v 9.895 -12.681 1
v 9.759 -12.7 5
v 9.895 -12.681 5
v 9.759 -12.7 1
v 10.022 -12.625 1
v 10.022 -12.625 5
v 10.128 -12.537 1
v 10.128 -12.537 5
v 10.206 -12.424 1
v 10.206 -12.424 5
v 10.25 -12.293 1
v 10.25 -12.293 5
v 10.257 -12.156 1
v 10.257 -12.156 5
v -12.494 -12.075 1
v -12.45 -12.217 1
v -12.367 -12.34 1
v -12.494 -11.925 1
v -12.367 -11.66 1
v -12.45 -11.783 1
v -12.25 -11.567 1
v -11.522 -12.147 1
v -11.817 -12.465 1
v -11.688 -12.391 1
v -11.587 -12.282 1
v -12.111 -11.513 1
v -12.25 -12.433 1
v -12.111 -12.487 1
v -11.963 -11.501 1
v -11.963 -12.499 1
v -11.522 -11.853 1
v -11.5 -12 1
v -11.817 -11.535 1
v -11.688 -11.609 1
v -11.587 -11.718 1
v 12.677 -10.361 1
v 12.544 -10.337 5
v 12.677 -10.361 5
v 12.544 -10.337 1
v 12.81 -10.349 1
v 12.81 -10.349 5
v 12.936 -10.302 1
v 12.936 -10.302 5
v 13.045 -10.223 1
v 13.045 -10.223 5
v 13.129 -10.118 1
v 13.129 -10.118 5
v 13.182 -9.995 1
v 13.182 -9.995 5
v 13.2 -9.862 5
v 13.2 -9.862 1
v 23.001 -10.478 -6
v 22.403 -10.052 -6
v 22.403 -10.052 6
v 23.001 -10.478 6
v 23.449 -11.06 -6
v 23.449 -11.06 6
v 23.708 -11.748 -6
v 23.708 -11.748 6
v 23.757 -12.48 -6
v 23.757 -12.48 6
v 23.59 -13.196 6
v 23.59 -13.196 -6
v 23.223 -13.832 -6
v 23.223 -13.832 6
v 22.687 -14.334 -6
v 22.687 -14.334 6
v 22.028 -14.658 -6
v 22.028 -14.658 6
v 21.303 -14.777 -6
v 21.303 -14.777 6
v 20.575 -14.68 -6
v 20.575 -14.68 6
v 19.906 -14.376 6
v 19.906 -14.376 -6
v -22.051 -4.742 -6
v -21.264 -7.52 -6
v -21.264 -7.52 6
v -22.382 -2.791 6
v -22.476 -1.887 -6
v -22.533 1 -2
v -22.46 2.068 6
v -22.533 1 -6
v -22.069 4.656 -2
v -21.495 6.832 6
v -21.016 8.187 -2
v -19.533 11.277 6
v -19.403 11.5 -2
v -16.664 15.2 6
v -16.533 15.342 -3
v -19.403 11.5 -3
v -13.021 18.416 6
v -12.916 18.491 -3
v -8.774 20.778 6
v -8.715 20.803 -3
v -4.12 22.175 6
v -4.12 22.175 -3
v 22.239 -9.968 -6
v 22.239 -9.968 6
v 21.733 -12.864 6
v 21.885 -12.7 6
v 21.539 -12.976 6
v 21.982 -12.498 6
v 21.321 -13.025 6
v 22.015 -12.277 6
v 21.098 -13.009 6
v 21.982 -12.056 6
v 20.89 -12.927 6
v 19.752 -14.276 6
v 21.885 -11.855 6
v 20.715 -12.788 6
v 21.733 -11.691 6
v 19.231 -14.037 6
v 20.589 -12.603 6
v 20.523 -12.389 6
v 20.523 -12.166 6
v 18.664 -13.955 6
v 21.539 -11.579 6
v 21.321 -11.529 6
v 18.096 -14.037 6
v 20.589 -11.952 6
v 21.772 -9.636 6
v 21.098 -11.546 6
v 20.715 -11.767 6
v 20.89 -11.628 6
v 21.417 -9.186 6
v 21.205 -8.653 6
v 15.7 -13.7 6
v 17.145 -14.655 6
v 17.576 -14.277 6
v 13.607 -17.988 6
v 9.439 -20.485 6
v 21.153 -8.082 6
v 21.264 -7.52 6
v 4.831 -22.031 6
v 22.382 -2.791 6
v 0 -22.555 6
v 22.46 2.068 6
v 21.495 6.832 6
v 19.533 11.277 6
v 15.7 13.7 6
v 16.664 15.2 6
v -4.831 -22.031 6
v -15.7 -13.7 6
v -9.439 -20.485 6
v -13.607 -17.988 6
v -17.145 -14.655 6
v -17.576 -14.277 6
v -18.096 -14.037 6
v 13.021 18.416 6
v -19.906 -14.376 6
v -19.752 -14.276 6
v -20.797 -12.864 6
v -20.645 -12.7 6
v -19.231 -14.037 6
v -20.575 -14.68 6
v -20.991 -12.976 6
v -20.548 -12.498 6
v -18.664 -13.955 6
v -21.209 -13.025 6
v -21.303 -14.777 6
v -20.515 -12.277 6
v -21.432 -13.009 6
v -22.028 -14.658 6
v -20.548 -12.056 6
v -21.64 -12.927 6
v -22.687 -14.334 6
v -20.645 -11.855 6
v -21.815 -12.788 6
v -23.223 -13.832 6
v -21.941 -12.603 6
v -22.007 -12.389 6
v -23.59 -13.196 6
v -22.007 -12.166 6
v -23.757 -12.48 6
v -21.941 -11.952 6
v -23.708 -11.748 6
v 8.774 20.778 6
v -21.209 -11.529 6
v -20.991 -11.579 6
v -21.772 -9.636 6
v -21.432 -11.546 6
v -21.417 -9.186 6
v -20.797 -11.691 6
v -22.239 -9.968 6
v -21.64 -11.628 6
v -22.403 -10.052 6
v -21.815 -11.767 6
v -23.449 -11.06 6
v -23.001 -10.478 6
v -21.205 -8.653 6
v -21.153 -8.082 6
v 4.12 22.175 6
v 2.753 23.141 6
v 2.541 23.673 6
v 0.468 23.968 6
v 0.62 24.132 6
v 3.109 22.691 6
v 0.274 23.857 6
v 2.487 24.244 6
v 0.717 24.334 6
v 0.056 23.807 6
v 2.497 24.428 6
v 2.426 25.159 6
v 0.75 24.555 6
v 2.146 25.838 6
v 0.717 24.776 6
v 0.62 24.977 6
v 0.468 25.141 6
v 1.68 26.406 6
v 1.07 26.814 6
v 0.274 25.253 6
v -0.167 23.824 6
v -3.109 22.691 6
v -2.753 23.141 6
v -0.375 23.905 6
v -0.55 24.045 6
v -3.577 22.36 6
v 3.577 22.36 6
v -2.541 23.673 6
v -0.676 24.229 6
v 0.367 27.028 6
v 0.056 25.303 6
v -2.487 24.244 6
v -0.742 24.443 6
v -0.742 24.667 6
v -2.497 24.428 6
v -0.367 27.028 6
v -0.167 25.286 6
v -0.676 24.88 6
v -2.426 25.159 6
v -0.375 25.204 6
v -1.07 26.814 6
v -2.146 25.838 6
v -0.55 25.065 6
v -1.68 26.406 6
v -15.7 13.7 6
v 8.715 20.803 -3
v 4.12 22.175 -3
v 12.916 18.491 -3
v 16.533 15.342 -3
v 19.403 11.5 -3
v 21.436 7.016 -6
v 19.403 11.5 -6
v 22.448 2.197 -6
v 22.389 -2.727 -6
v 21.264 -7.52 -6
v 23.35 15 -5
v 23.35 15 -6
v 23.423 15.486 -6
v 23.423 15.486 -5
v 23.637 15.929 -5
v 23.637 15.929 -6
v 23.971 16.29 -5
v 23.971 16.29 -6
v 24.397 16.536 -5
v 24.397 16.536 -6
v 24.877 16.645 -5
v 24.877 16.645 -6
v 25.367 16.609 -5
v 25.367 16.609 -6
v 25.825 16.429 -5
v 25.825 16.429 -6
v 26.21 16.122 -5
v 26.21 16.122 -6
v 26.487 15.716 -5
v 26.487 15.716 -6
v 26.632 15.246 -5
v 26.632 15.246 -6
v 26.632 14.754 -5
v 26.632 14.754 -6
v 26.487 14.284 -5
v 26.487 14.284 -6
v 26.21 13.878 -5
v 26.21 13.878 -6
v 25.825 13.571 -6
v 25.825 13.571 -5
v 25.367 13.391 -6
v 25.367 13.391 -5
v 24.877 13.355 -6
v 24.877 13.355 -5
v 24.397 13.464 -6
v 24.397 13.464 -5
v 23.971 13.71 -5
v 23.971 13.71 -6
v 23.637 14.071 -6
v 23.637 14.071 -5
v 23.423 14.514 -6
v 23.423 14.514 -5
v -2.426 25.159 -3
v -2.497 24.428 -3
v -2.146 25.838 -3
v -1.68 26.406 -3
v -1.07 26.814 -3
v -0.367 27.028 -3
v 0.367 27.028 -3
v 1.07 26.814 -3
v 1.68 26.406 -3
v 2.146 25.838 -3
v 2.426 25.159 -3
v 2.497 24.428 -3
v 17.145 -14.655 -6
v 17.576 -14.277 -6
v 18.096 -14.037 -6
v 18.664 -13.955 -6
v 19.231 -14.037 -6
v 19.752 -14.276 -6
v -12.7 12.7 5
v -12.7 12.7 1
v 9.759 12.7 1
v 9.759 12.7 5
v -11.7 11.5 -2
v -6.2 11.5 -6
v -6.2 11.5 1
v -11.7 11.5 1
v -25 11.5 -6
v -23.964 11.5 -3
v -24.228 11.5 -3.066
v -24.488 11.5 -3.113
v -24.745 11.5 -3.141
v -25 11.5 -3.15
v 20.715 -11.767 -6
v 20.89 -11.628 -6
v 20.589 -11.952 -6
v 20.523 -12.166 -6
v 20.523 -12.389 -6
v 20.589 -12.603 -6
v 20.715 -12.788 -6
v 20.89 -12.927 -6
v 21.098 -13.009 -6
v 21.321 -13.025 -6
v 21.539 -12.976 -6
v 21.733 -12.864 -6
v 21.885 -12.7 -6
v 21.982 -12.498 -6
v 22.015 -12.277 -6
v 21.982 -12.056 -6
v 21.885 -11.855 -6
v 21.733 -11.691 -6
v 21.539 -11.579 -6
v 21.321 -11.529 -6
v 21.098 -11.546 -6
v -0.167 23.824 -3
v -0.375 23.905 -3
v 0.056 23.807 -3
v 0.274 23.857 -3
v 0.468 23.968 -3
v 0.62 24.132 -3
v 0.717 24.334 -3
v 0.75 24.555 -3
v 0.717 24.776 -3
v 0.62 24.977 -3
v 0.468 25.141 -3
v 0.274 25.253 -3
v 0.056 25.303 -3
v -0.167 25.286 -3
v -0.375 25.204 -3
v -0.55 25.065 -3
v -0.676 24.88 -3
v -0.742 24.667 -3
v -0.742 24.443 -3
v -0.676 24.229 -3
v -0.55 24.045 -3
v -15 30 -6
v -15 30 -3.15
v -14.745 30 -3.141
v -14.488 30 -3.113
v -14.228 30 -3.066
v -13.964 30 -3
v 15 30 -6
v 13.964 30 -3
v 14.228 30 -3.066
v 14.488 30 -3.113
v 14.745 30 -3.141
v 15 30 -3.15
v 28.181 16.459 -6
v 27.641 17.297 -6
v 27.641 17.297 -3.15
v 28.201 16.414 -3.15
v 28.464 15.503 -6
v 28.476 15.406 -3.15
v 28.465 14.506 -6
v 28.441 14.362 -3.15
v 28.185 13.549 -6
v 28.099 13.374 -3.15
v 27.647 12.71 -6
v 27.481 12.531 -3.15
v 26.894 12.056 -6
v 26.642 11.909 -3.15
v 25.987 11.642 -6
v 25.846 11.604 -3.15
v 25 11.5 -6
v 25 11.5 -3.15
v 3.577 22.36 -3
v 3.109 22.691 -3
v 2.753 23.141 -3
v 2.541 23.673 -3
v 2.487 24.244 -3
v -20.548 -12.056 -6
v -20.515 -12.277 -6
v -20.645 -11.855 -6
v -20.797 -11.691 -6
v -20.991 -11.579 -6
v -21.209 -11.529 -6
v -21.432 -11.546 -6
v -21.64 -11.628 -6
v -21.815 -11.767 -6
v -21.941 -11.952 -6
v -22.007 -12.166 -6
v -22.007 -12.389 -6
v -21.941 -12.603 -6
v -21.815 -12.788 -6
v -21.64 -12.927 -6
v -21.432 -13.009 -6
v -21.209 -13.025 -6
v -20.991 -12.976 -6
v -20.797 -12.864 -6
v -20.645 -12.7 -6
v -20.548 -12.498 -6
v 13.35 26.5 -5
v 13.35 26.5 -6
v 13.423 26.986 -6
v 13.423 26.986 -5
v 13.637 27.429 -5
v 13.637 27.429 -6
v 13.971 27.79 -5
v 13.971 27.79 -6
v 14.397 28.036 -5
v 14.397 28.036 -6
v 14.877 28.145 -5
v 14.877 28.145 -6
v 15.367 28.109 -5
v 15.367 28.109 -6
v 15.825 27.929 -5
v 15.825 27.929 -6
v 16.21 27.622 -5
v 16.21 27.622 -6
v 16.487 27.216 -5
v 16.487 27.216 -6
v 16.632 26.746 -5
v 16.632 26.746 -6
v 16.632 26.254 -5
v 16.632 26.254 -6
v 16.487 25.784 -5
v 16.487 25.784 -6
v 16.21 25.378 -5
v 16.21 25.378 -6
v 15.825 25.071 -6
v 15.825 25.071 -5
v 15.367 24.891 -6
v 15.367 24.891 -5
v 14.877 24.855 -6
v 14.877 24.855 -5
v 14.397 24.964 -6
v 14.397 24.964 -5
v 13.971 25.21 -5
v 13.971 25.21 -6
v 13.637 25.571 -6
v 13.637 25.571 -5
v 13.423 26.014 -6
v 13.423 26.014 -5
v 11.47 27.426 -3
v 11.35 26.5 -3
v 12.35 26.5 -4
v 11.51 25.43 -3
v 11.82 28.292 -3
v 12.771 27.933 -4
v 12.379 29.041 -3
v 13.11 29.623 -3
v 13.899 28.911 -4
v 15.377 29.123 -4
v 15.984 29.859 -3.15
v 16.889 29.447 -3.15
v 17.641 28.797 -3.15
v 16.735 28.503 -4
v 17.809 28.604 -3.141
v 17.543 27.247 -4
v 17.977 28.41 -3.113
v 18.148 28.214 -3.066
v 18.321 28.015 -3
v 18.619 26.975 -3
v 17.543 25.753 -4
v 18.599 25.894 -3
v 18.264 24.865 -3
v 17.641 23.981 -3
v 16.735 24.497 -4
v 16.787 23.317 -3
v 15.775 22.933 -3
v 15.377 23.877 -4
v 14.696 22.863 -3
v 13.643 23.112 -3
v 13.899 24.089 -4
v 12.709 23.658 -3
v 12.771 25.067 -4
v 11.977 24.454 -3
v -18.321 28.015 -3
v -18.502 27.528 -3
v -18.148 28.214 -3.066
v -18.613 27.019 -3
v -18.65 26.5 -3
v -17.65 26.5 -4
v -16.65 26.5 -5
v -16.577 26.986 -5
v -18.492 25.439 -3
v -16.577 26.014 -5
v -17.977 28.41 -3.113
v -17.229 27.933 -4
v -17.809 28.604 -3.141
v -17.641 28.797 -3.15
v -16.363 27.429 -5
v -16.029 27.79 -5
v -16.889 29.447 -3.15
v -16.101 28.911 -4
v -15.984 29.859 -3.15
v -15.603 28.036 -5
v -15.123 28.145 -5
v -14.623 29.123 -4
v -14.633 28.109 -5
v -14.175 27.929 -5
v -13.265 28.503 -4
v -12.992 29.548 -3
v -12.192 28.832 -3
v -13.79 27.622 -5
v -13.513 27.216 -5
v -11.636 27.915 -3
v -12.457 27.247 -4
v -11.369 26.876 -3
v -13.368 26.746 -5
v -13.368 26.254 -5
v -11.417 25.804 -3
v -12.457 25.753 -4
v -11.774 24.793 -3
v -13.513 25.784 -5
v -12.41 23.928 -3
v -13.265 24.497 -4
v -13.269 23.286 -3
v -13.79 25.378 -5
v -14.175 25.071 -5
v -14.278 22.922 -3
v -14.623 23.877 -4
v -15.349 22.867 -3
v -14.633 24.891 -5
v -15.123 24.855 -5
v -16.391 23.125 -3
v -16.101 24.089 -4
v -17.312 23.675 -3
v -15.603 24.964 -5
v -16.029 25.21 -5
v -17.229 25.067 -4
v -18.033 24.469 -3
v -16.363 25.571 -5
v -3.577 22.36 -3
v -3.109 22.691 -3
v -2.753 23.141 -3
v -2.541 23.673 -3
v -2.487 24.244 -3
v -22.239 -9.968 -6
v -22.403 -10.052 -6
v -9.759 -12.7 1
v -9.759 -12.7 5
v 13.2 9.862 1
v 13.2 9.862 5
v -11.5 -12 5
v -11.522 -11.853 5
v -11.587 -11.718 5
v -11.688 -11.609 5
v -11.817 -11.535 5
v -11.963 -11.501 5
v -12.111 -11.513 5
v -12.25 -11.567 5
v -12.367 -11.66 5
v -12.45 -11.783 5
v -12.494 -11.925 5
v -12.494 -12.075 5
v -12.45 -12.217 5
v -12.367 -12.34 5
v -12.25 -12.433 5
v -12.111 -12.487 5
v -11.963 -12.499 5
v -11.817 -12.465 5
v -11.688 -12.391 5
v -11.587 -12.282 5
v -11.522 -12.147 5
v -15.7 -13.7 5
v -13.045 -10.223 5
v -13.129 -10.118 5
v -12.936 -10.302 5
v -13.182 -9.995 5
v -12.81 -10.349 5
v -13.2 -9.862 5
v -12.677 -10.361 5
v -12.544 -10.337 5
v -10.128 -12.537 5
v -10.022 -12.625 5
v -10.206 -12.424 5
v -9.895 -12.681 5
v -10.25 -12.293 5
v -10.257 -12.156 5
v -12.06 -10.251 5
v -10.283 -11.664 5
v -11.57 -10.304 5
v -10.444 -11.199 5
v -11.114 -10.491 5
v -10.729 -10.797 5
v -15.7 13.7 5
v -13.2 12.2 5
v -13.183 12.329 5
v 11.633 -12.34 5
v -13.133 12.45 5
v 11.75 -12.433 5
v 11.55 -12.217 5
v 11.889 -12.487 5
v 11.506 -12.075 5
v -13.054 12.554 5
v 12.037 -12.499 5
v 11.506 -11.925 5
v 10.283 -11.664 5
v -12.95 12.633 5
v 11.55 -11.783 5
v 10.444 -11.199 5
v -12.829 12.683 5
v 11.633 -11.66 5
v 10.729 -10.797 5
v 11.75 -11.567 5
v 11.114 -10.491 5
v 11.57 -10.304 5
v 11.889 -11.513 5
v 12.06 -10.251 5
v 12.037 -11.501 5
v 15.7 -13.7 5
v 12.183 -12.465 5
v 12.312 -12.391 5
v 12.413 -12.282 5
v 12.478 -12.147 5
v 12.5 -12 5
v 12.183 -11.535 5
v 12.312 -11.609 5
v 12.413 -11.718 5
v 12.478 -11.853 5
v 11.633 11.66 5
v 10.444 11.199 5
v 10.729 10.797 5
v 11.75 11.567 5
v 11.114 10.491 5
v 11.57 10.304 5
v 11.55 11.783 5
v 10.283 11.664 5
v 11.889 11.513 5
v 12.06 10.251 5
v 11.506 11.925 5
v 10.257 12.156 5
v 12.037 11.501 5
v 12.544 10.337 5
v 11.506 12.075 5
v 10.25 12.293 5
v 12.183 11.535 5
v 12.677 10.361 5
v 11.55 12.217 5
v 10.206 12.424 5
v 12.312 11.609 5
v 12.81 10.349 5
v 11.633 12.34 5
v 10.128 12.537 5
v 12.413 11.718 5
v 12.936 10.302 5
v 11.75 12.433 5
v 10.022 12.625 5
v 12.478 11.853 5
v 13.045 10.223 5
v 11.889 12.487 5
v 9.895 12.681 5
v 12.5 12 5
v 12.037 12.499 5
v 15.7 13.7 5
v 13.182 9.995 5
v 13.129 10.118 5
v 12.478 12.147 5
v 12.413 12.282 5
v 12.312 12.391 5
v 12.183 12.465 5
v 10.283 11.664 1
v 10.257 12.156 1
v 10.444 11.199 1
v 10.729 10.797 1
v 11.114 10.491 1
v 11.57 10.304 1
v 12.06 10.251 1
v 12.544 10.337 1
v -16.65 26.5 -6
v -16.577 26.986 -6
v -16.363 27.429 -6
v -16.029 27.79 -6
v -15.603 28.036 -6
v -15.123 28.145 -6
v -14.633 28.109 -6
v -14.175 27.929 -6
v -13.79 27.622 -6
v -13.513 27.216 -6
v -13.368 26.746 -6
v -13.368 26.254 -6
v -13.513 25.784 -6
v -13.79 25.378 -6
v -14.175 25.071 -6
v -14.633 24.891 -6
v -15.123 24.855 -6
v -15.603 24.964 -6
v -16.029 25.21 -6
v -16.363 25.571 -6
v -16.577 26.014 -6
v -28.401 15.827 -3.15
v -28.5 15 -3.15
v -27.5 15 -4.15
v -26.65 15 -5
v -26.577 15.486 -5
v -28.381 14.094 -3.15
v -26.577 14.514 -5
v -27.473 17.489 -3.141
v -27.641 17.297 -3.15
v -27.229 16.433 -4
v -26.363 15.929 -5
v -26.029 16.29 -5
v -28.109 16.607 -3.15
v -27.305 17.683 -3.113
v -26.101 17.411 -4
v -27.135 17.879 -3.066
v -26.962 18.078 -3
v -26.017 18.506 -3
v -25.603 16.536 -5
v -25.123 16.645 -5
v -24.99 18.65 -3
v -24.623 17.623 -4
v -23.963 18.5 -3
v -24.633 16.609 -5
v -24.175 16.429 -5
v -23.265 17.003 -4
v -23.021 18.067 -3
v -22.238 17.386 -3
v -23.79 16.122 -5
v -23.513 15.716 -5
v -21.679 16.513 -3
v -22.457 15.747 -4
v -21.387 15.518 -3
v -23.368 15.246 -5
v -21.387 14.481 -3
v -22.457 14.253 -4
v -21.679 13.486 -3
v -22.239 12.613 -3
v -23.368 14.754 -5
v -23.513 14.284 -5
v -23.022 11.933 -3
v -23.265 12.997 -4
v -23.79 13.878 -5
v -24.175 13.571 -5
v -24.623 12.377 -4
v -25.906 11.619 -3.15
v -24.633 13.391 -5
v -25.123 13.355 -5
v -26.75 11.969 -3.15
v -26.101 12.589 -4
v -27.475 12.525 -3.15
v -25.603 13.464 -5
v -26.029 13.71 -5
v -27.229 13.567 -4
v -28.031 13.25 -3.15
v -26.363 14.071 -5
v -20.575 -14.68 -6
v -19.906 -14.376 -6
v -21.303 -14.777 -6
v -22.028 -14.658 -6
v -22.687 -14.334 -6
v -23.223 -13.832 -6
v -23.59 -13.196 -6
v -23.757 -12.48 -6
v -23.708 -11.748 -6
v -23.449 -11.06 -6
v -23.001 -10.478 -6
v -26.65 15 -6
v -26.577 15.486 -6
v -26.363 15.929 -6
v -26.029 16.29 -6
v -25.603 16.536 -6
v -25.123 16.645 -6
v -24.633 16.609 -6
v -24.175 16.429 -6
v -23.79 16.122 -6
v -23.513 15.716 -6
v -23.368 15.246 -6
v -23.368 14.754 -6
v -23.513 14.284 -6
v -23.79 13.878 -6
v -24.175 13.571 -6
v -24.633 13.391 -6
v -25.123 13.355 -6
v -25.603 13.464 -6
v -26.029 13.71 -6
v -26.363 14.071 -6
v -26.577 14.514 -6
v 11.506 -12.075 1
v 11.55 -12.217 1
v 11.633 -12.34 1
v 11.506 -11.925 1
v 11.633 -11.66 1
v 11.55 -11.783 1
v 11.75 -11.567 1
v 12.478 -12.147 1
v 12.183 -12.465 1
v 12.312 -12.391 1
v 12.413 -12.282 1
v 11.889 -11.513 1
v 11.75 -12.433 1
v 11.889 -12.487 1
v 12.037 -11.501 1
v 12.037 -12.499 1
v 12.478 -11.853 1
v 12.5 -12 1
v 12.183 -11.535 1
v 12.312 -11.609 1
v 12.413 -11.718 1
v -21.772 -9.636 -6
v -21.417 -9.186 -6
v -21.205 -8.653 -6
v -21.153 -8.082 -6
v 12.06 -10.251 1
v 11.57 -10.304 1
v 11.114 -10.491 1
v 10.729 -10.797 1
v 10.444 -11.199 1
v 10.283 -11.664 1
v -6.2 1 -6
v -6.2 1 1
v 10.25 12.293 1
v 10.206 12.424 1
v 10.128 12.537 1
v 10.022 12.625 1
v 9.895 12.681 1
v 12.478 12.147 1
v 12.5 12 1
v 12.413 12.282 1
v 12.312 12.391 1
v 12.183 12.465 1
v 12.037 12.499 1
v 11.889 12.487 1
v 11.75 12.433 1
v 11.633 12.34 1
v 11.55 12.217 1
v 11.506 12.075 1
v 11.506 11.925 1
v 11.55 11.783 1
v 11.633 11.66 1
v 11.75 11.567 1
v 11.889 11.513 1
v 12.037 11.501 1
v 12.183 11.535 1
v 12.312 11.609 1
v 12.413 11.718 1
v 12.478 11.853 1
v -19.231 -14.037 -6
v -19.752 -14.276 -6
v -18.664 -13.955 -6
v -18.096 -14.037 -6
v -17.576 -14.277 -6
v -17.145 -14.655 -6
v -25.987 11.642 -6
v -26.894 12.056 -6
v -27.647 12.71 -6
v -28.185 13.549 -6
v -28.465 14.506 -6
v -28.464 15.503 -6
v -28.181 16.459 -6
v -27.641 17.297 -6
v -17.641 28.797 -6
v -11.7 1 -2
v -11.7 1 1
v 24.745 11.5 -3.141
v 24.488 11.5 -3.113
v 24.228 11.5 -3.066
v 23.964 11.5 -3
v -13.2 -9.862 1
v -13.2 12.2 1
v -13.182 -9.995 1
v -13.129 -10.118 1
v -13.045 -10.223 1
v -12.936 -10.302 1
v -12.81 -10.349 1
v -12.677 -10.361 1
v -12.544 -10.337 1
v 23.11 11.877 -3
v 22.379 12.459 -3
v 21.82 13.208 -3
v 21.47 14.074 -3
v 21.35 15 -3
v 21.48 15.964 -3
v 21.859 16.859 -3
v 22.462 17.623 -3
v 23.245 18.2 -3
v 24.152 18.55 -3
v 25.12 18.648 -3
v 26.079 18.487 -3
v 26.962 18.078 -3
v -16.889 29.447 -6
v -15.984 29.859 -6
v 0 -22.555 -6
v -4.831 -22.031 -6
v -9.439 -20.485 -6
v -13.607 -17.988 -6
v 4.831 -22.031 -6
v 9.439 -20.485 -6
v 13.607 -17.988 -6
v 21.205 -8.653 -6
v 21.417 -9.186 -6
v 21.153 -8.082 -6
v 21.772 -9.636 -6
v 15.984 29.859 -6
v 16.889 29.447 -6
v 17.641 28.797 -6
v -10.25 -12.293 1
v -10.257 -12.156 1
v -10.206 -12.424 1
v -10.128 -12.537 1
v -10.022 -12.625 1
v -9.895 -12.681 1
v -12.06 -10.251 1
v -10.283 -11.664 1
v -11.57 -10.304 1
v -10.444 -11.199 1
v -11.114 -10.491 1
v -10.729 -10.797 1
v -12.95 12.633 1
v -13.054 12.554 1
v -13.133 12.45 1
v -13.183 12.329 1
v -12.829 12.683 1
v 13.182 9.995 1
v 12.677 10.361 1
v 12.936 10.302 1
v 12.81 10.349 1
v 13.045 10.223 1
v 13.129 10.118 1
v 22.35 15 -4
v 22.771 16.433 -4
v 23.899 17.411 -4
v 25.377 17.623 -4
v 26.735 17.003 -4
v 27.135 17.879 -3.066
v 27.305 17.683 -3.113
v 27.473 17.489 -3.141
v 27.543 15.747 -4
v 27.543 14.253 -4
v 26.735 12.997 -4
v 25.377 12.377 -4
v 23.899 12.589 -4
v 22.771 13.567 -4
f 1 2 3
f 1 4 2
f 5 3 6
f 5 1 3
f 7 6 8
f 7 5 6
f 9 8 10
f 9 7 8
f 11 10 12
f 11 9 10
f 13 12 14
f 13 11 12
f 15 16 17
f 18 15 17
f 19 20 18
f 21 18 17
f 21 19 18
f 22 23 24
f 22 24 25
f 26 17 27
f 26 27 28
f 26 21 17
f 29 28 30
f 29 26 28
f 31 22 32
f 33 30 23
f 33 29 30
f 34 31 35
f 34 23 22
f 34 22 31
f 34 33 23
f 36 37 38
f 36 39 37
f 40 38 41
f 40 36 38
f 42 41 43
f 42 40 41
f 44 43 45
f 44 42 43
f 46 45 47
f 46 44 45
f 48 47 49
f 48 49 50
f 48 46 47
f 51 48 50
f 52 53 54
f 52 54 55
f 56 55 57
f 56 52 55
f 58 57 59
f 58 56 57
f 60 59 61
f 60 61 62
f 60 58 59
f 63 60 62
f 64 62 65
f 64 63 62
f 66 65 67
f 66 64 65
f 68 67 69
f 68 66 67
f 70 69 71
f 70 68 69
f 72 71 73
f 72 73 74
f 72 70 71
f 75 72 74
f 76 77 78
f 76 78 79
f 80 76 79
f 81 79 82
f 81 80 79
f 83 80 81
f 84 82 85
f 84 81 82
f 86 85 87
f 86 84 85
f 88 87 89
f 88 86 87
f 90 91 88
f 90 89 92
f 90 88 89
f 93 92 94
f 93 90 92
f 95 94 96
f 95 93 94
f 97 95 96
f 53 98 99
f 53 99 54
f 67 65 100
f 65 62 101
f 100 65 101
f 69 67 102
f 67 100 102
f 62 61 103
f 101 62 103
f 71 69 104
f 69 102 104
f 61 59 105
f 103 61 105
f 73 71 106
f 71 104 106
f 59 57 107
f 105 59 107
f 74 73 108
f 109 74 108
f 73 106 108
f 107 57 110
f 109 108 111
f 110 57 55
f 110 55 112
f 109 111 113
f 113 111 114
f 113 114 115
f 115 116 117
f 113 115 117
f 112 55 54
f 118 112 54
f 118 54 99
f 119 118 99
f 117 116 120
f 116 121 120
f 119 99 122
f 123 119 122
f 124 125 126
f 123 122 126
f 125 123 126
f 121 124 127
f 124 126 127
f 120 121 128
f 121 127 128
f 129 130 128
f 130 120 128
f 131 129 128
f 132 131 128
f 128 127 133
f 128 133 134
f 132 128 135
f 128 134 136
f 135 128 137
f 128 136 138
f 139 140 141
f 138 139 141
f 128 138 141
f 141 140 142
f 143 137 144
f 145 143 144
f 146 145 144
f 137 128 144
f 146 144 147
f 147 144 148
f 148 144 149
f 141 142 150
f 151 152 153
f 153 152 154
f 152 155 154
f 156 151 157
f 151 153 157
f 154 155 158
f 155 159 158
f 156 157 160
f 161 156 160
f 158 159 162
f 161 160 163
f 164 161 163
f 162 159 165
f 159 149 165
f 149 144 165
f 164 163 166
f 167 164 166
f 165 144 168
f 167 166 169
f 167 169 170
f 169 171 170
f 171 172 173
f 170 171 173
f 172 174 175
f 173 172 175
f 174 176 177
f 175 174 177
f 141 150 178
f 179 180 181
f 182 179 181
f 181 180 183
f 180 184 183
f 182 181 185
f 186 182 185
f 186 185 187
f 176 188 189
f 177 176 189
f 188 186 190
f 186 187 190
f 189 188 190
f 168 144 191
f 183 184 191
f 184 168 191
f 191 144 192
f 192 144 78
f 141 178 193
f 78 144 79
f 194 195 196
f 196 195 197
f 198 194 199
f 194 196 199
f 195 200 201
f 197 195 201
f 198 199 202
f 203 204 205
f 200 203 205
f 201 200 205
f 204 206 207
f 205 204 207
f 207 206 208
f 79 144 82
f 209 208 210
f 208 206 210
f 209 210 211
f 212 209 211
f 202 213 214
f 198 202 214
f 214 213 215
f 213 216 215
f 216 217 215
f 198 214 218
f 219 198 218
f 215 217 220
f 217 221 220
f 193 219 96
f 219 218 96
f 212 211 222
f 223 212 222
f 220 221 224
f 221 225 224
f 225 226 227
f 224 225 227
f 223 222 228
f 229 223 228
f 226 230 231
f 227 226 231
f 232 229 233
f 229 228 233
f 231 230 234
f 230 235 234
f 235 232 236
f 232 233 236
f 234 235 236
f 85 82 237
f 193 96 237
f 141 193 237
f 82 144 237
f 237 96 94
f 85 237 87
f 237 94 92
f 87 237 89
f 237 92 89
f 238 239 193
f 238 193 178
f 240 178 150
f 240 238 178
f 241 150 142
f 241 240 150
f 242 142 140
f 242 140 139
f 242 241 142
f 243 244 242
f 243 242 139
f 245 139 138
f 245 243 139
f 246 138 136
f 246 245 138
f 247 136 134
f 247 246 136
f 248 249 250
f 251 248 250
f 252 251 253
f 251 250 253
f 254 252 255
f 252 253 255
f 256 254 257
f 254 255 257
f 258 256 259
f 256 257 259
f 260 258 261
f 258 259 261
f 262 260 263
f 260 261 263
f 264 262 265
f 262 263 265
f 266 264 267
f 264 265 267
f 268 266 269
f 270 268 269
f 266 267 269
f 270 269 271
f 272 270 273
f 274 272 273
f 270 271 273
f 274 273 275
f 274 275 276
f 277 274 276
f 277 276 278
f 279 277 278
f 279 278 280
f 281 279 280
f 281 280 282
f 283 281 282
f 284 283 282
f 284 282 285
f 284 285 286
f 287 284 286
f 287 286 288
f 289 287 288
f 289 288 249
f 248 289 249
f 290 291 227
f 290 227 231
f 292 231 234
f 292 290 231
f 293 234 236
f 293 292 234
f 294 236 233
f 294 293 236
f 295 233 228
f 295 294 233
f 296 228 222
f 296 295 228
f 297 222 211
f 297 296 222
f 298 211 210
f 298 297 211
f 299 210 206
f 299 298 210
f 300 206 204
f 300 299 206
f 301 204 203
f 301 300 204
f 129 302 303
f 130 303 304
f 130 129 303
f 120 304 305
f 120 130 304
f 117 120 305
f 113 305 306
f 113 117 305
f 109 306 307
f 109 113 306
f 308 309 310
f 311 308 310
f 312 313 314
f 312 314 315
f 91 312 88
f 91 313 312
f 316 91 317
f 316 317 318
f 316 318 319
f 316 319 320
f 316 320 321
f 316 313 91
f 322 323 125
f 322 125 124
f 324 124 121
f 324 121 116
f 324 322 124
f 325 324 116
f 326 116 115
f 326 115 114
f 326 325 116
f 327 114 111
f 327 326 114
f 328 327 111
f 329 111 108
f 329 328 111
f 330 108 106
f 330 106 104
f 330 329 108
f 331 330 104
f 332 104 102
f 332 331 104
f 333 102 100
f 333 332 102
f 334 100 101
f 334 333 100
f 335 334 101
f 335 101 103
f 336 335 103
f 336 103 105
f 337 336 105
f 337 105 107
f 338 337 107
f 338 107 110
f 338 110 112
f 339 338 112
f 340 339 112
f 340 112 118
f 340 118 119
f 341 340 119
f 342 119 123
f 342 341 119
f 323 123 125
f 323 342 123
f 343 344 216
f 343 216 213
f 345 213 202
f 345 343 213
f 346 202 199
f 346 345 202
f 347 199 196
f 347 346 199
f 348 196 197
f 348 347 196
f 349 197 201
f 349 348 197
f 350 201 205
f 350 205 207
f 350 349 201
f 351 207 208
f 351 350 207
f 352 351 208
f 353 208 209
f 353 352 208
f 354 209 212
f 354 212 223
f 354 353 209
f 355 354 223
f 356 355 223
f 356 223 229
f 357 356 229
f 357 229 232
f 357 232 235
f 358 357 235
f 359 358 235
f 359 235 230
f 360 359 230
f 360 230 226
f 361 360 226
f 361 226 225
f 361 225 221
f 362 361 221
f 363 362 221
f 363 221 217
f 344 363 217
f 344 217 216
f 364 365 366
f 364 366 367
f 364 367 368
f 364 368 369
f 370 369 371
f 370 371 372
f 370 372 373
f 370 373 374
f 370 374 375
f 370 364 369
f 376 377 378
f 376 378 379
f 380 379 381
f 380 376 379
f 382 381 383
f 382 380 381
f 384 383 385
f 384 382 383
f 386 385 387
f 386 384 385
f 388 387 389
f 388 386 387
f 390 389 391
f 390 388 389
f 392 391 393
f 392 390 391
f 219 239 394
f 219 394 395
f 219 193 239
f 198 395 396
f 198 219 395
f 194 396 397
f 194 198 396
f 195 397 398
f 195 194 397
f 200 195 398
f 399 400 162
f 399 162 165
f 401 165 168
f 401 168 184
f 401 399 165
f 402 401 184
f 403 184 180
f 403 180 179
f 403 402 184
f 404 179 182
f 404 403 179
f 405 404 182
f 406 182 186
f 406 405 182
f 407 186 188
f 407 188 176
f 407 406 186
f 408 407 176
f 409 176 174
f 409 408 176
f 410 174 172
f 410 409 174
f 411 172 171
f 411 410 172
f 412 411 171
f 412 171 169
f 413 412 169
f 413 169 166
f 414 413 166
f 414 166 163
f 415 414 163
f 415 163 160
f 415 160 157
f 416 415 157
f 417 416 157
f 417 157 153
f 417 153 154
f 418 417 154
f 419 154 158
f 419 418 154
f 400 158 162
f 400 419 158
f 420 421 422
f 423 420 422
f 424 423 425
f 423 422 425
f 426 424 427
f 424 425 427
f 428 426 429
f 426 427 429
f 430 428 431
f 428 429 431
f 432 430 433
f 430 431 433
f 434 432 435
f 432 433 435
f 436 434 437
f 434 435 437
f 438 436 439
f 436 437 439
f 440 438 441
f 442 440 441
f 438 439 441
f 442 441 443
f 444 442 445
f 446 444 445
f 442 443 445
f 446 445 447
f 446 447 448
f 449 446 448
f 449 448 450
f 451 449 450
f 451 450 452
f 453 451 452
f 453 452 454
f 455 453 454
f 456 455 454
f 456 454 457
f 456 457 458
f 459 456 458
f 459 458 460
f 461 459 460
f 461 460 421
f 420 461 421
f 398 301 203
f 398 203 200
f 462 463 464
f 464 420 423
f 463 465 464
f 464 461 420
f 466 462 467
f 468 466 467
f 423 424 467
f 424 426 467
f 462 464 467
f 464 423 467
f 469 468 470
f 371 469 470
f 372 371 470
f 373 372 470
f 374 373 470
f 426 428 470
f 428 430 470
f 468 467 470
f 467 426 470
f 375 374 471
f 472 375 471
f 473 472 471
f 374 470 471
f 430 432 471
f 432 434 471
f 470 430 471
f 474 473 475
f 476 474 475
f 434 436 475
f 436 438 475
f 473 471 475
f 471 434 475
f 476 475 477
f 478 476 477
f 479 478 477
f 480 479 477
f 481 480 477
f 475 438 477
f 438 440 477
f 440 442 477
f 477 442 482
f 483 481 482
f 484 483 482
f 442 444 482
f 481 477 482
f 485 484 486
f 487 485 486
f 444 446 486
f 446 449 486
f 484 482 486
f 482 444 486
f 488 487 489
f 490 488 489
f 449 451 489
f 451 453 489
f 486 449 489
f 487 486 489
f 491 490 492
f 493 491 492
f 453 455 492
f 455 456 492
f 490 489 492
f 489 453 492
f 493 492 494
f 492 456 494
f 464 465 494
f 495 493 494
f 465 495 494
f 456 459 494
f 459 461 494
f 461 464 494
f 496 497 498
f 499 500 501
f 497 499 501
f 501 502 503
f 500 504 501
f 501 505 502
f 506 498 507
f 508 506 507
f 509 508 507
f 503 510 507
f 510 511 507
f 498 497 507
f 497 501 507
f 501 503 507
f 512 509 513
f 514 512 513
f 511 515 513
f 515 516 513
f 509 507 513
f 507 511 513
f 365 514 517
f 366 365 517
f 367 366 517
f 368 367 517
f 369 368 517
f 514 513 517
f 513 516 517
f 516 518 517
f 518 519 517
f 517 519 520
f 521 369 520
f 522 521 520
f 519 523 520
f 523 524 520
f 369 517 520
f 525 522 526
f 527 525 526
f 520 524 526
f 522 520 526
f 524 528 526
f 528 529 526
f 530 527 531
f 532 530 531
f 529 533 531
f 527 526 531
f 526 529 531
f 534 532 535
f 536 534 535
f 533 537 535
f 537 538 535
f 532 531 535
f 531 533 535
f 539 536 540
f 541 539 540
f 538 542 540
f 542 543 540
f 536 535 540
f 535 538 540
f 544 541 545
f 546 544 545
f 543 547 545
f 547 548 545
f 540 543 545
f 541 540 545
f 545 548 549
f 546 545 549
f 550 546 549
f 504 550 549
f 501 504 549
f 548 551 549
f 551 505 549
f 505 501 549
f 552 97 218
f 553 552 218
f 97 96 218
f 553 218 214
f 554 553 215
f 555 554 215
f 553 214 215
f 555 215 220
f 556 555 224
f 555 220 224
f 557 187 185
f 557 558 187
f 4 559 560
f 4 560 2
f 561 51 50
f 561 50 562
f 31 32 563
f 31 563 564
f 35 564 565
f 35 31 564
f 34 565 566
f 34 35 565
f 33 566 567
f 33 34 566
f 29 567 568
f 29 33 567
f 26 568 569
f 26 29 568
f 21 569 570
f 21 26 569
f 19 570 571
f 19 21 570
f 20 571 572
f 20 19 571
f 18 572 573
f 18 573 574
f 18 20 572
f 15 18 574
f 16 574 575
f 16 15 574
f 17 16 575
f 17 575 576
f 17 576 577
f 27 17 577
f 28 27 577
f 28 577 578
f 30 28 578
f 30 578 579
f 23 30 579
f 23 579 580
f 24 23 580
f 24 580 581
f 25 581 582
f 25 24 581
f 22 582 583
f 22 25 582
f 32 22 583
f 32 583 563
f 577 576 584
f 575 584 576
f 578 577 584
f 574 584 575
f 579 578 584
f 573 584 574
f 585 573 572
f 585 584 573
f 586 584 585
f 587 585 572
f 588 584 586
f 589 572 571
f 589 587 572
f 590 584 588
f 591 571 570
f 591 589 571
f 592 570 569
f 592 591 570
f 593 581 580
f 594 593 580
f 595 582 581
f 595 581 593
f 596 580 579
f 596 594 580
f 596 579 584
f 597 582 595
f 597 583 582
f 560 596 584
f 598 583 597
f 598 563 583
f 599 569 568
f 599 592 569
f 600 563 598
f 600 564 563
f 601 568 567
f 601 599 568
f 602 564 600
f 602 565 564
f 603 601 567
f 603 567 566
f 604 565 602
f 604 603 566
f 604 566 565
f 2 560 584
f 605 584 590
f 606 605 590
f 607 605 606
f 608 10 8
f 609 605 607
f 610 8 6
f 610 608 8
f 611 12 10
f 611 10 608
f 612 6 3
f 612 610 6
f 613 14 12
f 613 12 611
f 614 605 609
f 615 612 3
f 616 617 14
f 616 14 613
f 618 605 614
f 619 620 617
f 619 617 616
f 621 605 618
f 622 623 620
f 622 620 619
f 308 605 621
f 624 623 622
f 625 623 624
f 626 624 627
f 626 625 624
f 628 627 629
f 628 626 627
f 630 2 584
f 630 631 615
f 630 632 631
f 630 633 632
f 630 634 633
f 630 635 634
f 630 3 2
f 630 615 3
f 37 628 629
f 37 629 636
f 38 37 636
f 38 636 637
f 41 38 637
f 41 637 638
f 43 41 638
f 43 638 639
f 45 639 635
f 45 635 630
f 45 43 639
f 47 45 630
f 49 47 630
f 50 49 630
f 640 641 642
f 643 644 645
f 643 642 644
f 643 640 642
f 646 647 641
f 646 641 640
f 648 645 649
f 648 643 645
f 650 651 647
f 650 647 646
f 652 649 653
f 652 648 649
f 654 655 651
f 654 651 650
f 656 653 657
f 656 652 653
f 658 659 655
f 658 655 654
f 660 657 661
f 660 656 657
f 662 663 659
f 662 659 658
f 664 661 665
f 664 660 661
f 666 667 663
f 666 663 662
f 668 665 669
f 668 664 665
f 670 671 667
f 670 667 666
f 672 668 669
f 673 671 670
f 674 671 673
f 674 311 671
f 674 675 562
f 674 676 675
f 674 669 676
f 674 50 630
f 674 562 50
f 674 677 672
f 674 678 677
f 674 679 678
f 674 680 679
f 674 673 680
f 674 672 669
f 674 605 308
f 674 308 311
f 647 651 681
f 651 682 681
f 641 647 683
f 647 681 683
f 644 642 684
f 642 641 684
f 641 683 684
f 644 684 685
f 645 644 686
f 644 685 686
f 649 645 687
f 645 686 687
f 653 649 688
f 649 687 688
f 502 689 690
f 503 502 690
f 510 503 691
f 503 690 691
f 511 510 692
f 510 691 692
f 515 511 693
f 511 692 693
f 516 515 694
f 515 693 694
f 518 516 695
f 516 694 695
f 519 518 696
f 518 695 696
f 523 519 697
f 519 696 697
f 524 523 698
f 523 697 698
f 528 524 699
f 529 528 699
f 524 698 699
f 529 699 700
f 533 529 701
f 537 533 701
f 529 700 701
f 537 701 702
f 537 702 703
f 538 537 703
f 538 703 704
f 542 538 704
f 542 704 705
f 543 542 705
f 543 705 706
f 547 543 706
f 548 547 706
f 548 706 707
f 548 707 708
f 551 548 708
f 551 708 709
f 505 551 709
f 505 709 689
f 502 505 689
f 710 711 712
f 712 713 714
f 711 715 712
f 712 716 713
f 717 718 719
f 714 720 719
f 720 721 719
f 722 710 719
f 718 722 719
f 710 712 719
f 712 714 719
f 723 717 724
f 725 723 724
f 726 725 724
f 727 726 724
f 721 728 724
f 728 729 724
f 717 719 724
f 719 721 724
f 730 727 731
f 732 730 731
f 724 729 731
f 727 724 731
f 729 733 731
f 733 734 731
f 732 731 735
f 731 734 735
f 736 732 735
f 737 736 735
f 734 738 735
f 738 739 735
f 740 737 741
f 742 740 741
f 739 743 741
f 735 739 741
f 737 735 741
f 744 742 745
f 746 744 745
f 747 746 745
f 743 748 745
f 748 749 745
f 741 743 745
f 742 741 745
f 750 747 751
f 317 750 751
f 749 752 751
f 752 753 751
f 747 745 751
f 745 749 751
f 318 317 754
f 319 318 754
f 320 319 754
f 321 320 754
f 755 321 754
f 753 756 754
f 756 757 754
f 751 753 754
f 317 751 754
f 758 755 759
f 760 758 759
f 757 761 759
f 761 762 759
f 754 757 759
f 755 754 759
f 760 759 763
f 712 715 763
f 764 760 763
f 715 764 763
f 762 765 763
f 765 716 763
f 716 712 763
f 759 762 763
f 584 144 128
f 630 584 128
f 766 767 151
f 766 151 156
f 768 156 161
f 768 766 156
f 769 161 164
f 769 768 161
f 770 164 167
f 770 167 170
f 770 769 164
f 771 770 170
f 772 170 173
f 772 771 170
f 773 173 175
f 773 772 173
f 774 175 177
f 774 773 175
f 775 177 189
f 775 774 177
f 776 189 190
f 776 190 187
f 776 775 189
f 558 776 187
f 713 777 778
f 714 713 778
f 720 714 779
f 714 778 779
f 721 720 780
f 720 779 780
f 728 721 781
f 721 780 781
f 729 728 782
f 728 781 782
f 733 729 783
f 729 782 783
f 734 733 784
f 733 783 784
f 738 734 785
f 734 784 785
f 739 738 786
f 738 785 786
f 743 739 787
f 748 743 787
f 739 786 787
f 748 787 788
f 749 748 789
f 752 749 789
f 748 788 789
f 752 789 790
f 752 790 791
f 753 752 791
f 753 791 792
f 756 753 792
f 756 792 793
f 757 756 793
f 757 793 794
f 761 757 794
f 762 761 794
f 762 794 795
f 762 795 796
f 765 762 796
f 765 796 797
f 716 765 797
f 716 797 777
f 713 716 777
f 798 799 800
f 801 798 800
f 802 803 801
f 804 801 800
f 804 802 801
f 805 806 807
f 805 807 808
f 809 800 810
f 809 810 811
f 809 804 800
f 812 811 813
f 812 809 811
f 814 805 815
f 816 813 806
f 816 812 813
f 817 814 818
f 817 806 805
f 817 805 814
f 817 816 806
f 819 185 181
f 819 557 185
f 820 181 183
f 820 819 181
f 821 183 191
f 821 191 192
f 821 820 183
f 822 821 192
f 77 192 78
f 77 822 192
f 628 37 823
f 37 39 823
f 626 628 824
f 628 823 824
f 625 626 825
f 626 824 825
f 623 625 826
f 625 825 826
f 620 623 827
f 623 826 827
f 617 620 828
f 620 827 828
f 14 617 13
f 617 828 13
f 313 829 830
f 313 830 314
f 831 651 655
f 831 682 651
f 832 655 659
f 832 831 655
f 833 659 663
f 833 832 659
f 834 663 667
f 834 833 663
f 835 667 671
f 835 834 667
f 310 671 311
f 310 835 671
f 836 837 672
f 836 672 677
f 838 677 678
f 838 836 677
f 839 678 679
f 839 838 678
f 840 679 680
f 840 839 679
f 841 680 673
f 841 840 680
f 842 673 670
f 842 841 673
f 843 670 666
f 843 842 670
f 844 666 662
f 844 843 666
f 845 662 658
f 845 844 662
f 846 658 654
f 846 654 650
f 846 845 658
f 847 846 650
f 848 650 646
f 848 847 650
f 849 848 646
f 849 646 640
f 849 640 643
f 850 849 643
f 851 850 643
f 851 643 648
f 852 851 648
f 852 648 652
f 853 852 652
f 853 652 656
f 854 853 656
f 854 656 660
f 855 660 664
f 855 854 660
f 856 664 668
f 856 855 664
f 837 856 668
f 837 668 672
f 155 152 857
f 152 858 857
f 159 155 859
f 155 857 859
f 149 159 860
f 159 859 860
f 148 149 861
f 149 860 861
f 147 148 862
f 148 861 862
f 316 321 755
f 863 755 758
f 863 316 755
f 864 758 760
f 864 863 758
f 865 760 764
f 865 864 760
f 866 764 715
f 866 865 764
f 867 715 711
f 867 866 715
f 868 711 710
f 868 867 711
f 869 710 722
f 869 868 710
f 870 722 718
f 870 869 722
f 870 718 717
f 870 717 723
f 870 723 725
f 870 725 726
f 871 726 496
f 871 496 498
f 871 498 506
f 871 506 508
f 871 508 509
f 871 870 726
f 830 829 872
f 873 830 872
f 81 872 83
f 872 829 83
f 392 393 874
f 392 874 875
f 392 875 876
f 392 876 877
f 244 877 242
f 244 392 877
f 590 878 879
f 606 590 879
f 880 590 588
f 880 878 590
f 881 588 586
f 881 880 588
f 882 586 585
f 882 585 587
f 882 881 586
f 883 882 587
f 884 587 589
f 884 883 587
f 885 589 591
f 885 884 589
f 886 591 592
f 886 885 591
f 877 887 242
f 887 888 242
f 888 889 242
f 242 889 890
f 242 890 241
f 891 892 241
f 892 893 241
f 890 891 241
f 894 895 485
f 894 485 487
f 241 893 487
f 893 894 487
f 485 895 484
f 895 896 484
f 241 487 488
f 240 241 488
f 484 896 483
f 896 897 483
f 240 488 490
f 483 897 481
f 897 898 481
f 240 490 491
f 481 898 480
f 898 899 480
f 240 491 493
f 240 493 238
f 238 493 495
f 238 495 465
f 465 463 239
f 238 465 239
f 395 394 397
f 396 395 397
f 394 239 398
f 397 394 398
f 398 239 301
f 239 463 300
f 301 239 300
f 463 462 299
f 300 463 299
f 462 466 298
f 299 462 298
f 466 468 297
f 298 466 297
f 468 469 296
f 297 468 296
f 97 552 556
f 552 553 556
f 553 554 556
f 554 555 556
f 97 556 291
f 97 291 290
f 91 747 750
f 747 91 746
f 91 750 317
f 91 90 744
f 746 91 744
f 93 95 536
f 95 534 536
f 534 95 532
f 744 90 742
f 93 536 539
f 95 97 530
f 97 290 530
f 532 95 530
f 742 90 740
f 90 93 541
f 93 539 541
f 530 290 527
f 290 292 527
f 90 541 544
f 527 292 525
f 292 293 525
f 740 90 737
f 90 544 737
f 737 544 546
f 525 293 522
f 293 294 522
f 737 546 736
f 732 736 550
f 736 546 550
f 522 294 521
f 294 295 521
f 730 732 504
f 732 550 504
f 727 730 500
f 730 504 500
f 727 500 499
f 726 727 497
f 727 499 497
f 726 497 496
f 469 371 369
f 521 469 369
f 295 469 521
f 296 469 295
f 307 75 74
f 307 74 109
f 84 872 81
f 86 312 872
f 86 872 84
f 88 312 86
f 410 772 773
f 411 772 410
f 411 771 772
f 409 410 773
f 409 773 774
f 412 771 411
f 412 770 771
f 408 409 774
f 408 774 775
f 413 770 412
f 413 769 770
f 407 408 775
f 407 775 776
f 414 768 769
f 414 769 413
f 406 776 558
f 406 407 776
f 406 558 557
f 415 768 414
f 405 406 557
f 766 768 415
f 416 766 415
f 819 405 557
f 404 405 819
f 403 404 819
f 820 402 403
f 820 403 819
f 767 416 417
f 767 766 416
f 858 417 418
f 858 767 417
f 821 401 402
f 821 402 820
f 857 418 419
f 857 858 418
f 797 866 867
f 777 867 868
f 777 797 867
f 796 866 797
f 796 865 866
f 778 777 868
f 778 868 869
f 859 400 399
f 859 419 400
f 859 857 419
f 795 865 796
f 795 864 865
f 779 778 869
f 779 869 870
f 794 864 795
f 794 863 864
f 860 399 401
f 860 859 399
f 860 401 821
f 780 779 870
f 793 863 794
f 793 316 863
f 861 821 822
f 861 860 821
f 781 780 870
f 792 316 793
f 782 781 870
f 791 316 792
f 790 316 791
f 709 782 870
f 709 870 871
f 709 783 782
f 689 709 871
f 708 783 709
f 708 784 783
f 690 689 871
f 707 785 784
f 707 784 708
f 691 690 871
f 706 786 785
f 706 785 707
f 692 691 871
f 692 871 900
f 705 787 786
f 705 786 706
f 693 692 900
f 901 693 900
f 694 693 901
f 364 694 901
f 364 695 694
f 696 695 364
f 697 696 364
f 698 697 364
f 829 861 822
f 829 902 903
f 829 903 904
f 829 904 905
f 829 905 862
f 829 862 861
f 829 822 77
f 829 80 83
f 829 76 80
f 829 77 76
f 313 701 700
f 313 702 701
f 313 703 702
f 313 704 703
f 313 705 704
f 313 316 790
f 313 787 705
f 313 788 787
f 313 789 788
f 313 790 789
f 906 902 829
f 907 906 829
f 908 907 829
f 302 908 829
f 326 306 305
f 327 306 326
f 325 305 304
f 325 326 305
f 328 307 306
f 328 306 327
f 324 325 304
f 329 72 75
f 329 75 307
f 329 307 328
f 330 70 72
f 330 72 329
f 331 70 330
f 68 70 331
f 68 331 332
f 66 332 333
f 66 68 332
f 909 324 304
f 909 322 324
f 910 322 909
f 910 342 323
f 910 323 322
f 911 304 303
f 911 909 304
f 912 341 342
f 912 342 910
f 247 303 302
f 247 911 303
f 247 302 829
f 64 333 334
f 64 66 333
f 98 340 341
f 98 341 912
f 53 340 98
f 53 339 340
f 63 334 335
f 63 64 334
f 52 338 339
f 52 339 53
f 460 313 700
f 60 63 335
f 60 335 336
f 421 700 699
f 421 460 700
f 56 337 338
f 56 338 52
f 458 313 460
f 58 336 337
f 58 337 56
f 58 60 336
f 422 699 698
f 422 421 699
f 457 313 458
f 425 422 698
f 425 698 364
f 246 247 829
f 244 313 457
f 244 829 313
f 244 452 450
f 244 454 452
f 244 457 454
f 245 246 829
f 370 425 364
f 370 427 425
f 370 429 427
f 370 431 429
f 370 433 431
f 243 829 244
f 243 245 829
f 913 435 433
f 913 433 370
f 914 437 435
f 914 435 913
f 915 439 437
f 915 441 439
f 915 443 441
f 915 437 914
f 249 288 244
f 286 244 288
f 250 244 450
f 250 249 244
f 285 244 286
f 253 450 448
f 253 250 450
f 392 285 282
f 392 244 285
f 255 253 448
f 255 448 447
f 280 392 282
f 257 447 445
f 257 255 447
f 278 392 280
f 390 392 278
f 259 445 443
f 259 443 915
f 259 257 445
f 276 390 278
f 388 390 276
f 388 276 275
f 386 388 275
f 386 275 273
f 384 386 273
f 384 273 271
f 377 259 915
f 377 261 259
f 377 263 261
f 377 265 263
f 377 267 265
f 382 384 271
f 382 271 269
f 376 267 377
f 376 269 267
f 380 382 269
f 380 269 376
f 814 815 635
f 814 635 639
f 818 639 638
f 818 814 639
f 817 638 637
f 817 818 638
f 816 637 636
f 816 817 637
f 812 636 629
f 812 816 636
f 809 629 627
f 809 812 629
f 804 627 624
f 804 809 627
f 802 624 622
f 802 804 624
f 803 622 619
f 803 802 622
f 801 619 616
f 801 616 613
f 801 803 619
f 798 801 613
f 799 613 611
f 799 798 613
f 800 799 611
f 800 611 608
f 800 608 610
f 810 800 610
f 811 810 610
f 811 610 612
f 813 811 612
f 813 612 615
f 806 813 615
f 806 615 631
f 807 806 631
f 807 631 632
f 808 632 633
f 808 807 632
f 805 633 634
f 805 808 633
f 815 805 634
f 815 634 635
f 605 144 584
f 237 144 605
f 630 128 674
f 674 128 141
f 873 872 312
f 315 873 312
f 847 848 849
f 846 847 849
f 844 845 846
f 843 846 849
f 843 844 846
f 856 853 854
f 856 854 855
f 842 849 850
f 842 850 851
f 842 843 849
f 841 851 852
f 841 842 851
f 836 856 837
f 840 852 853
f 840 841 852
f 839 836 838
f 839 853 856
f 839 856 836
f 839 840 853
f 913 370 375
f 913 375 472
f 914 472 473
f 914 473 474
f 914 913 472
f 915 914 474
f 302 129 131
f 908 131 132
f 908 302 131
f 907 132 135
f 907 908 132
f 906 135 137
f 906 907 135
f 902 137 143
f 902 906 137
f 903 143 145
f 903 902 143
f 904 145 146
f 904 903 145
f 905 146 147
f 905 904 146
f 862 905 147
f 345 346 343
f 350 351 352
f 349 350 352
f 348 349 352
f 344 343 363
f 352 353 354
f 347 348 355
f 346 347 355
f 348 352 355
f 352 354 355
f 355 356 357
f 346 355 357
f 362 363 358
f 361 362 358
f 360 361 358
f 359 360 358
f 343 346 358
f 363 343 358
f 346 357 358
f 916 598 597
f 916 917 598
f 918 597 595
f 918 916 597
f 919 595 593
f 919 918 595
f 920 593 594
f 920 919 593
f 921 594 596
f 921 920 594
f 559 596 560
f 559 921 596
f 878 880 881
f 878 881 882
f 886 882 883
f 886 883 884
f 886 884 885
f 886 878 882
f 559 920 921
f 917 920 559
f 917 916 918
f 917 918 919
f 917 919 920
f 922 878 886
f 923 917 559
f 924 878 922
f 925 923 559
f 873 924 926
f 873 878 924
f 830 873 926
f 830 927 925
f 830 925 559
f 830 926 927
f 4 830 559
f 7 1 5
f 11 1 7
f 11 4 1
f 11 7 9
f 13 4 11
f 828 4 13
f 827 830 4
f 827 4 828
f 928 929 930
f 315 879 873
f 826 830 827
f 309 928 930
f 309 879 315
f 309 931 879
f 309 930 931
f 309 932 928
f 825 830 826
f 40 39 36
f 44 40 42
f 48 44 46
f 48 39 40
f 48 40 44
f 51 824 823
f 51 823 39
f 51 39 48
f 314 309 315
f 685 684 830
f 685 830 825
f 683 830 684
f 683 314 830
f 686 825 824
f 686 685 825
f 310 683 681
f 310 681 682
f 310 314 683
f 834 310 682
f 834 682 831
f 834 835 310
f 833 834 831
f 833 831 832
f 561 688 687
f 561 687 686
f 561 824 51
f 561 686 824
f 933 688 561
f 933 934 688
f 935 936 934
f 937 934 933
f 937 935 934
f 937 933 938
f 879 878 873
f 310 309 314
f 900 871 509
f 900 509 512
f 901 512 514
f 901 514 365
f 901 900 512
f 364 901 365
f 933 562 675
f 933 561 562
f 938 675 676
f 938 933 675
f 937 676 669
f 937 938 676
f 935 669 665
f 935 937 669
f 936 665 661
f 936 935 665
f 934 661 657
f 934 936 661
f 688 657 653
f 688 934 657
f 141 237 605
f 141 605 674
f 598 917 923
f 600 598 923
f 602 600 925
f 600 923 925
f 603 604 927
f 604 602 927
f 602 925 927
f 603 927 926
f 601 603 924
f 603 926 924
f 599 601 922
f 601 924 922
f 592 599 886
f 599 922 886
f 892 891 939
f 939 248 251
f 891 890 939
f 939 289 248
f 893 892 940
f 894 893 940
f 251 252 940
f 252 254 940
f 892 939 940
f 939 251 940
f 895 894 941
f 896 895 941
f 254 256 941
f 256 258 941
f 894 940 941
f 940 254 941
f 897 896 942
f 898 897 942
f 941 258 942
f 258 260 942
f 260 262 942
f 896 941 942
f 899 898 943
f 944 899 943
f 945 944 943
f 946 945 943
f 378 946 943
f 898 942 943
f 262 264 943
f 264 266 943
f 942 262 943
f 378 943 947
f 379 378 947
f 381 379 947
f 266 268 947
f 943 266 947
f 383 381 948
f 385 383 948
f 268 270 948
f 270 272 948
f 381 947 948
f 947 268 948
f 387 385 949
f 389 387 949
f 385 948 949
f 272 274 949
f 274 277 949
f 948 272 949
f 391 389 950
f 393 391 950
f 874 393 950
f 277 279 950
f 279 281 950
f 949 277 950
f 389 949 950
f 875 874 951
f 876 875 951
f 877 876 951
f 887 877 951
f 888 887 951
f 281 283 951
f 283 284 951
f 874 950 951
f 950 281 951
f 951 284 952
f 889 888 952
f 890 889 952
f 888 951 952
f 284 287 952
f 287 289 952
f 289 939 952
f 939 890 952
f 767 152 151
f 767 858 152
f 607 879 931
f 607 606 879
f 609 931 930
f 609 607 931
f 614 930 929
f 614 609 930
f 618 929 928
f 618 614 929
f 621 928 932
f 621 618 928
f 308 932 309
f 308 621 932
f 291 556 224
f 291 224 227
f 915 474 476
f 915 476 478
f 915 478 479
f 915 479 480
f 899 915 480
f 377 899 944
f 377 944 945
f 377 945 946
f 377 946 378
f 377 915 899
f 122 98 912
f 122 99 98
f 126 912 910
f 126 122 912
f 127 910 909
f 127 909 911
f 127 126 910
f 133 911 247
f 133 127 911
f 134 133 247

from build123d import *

# Parameters (mm, degrees)
SKETCH_1_R                       = 22.554804791
EXTRUDE_463_DEPTH                = 6
SKETCH_2_W                       = 31.4
SKETCH_2_H                       = 27.4
CUT_EXTRUDE_592_DEPTH            = 5
SKETCH_3_R                       = 1.75
SKETCH_3_R_2                     = 0.5
EXTRUDE_810_DEPTH                = 4
SKETCH_4_W                       = 5.5
SKETCH_4_H                       = 10.5
USB_DEPTH                        = 33.28681524
SKETCH_5_W                       = 31.4
SKETCH_5_H                       = 27.4
SKETCH_5_W_2                     = 26.4
SKETCH_5_H_2                     = 25.4
EXTRUDE_1363_DEPTH               = 4
FILLET_1_R                       = 0.5
EXTRUDE_START                    = 6
SKETCH_6_R                       = 22.554804791
SKETCH_6_W                       = 5.5
SKETCH_6_H                       = 10.5
EXTRUDE_1904_DEPTH               = 6
SKETCH_7_W                       = 10.832625661
SKETCH_7_H                       = 10.5
CUT_EXTRUDE_2094_DEPTH           = 4
SKETCH_8_R                       = 1.65
EXTRUDE_2468_DEPTH               = 3
CHAMFER_1_SIZE                   = 2
EXTRUDE_START_2                  = -12
SKETCH_14_R                      = 0.75
EXTRUDE_2869_DEPTH               = 12
FILLET_3_R                       = 2
PATTERN_CIRCULAR_1_COUNT         = 3
FILLET_3_OF_PATTERN_CIRCULAR_1_R = 2


with BuildPart() as part:
    # Эскиз1 → Extrude 463 (new body)
    with BuildSketch(Plane.XY):
        Circle(SKETCH_1_R)
    extrude(amount=EXTRUDE_463_DEPTH)

    # Эскиз2 → Cut-Extrude 592 (cut)
    with BuildSketch(Plane.XY.offset(6)):
        Rectangle(SKETCH_2_W, SKETCH_2_H)
    extrude(amount=-CUT_EXTRUDE_592_DEPTH, mode=Mode.SUBTRACT)

    # Эскиз3 → Extrude 810 (add)
    # profile 1 of 3: a face of its own
    with BuildSketch(Plane.XY.offset(1)):
        with Locations((-12, -12)):
            Circle(SKETCH_3_R)
        with Locations((-12, -12)):
            Circle(SKETCH_3_R_2, mode=Mode.SUBTRACT)
    # profile 2 of 3: a face of its own
    with BuildSketch(Plane.XY.offset(1)):
        with Locations((12, -12)):
            Circle(SKETCH_3_R)
        with Locations((12, -12)):
            Circle(SKETCH_3_R_2, mode=Mode.SUBTRACT)
    # profile 3 of 3: a face of its own
    with BuildSketch(Plane.XY.offset(1)):
        with Locations((12, 12)):
            Circle(SKETCH_3_R)
        with Locations((12, 12)):
            Circle(SKETCH_3_R_2, mode=Mode.SUBTRACT)
    extrude(amount=EXTRUDE_810_DEPTH)

    # Эскиз4 → usb (cut, through all)
    with BuildSketch(Plane.XY.offset(1)):
        with Locations((-8.95, 6.25)):
            Rectangle(SKETCH_4_W, SKETCH_4_H)
    extrude(amount=-USB_DEPTH, mode=Mode.SUBTRACT)

    # Эскиз5 → Extrude 1363 (add)
    with BuildSketch(Plane.XY.offset(1)):
        Rectangle(SKETCH_5_W, SKETCH_5_H)
        Rectangle(SKETCH_5_W_2, SKETCH_5_H_2, mode=Mode.SUBTRACT)
    extrude(amount=EXTRUDE_1363_DEPTH)

    # Скругление1
    fillet_1_edges = [part.edges().sort_by_distance(p)[0] for p in [
        (10.396098507, 12.7, 3),
        (13.2, 10.72622608, 3),
        (10.396098507, -12.7, 3),
        (-13.2, -10.72622608, 3),
        (-10.396098507, -12.7, 3),
        (13.2, -10.72622608, 3),
        (-13.2, 12.7, 3),
    ]]
    fillet(fillet_1_edges, radius=FILLET_1_R)

    # Эскиз6 → Extrude 1904 (add)
    with BuildSketch(Plane(origin=(0, 0, 0), x_dir=(-1, 0, 0), z_dir=(0, 0, -1)).offset(EXTRUDE_START)):
        Circle(SKETCH_6_R)
        with Locations((8.95, 6.25)):
            Rectangle(SKETCH_6_W, SKETCH_6_H, mode=Mode.SUBTRACT)
    extrude(amount=-EXTRUDE_1904_DEPTH)

    # Эскиз7 → Cut-Extrude 2094 (cut)
    with BuildSketch(Plane(origin=(0, 0, -6), x_dir=(-1, 0, 0), z_dir=(0, 0, -1))):
        with Locations((17.116312831, 6.25)):
            Rectangle(SKETCH_7_W, SKETCH_7_H)
    extrude(amount=-CUT_EXTRUDE_2094_DEPTH, mode=Mode.SUBTRACT)

    # Эскиз8 → Extrude 2468 (add)
    with BuildSketch(Plane(origin=(0, 0, -6), x_dir=(-1, 0, 0), z_dir=(0, 0, -1))):
        with BuildLine():
            Line((-25, 11.5), (-19.402814723, 11.5))
            ThreePointArc((-19.402814723, 11.5), (0, 22.554804791), (19.402814723, 11.5))
            Line((19.402814723, 11.5), (25, 11.5))
            ThreePointArc((25, 11.5), (28.184979534, 13.548826209), (27.641119328, 17.296625502))
            Line((27.641119328, 17.296625502), (17.641119328, 28.796625502))
            ThreePointArc((17.641119328, 28.796625502), (16.451173791, 29.684979534), (15, 30))
            Line((15, 30), (-15, 30))
            ThreePointArc((-15, 30), (-16.451173791, 29.684979534), (-17.641119328, 28.796625502))
            Line((-17.641119328, 28.796625502), (-27.641119328, 17.296625502))
            ThreePointArc((-27.641119328, 17.296625502), (-28.184979534, 13.548826209), (-25, 11.5))
        make_face()
        with Locations((-15, 26.5)):
            Circle(SKETCH_8_R, mode=Mode.SUBTRACT)
        with Locations((15, 26.5)):
            Circle(SKETCH_8_R, mode=Mode.SUBTRACT)
        with Locations((25, 15)):
            Circle(SKETCH_8_R, mode=Mode.SUBTRACT)
        with Locations((-25, 15)):
            Circle(SKETCH_8_R, mode=Mode.SUBTRACT)
    extrude(amount=-EXTRUDE_2468_DEPTH)

    # Фаска1
    # the kernel refuses this chamfer: 2 mm, written as the material it takes off along each edge
    with BuildSketch(Plane(origin=(-25, 15, -3), x_dir=(-1, 0, 0), z_dir=(0, -1, 0))) as chamfer_1_piece_1:
        Polygon((1.65 + CHAMFER_1_SIZE, 0), (1.65, CHAMFER_1_SIZE), (1.65, 0), align=None)
    revolve(axis=Axis((-25, 15, -3), (0, 0, -1)), mode=Mode.SUBTRACT)
    with BuildSketch(Plane(origin=(-15, 26.5, -3), x_dir=(-1, 0, 0), z_dir=(0, -1, 0))) as chamfer_1_piece_2:
        Polygon((1.65 + CHAMFER_1_SIZE, 0), (1.65, CHAMFER_1_SIZE), (1.65, 0), align=None)
    revolve(axis=Axis((-15, 26.5, -3), (0, 0, -1)), mode=Mode.SUBTRACT)
    with BuildSketch(Plane(origin=(25, 15, -3), x_dir=(-1, 0, 0), z_dir=(0, -1, 0))) as chamfer_1_piece_3:
        Polygon((1.65 + CHAMFER_1_SIZE, 0), (1.65, CHAMFER_1_SIZE), (1.65, 0), align=None)
    revolve(axis=Axis((25, 15, -3), (0, 0, -1)), mode=Mode.SUBTRACT)
    with BuildSketch(Plane(origin=(15, 26.5, -3), x_dir=(-1, 0, 0), z_dir=(0, -1, 0))) as chamfer_1_piece_4:
        Polygon((1.65 + CHAMFER_1_SIZE, 0), (1.65, CHAMFER_1_SIZE), (1.65, 0), align=None)
    revolve(axis=Axis((15, 26.5, -3), (0, 0, -1)), mode=Mode.SUBTRACT)

    # Эскиз14 → Extrude 2869 (add)
    with BuildSketch(Plane.XY.offset(6).offset(EXTRUDE_START_2)):
        with BuildLine():
            Line((-22.403248133, -10.051512893), (-20.620019257, -9.139695017))
            ThreePointArc((-20.620019257, -9.139695017), (-19.533033926, -11.277402396), (-18.225217696, -13.287612994))
            Line((-18.225217696, -13.287612994), (-19.906489578, -14.376025564))
            ThreePointArc((-19.906489578, -14.376025564), (-23.430148244, -13.527402396), (-22.403248133, -10.051512893))
        make_face()
        with Locations((-21.265084734, -12.277402396)):
            Circle(SKETCH_14_R, mode=Mode.SUBTRACT)
    extrude_2869 = extrude(amount=EXTRUDE_2869_DEPTH)

    # Скругление3
    fillet_3_edges = [part.edges().sort_by_distance(p)[0] for p in [
        (-20.620019257, -9.139695017, 0),
        (-18.225217696, -13.287612994, 0),
    ]]
    fillet(fillet_3_edges, radius=FILLET_3_R)

    # Круговой массив1: Extrude 2869 ×3 about axis
    pattern_circular_1_axis = Axis((0, 0, 0), (0, 0, 1))
    for i in range(1, PATTERN_CIRCULAR_1_COUNT):
        add(extrude_2869.rotate(pattern_circular_1_axis, i * 360 / PATTERN_CIRCULAR_1_COUNT))

    # Скругление3 of Круговой массив1
    fillet_3_of_pattern_circular_1_edges = [part.edges().sort_by_distance(p)[0] for p in [
        (18.225217696, -13.287612994, 0),
        (20.620019257, -9.139695017, 0),
        (2.394801561, 22.427308012, 0),
        (-2.394801561, 22.427308012, 0),
    ]]
    fillet(fillet_3_of_pattern_circular_1_edges, radius=FILLET_3_OF_PATTERN_CIRCULAR_1_R)


solid = part.part
